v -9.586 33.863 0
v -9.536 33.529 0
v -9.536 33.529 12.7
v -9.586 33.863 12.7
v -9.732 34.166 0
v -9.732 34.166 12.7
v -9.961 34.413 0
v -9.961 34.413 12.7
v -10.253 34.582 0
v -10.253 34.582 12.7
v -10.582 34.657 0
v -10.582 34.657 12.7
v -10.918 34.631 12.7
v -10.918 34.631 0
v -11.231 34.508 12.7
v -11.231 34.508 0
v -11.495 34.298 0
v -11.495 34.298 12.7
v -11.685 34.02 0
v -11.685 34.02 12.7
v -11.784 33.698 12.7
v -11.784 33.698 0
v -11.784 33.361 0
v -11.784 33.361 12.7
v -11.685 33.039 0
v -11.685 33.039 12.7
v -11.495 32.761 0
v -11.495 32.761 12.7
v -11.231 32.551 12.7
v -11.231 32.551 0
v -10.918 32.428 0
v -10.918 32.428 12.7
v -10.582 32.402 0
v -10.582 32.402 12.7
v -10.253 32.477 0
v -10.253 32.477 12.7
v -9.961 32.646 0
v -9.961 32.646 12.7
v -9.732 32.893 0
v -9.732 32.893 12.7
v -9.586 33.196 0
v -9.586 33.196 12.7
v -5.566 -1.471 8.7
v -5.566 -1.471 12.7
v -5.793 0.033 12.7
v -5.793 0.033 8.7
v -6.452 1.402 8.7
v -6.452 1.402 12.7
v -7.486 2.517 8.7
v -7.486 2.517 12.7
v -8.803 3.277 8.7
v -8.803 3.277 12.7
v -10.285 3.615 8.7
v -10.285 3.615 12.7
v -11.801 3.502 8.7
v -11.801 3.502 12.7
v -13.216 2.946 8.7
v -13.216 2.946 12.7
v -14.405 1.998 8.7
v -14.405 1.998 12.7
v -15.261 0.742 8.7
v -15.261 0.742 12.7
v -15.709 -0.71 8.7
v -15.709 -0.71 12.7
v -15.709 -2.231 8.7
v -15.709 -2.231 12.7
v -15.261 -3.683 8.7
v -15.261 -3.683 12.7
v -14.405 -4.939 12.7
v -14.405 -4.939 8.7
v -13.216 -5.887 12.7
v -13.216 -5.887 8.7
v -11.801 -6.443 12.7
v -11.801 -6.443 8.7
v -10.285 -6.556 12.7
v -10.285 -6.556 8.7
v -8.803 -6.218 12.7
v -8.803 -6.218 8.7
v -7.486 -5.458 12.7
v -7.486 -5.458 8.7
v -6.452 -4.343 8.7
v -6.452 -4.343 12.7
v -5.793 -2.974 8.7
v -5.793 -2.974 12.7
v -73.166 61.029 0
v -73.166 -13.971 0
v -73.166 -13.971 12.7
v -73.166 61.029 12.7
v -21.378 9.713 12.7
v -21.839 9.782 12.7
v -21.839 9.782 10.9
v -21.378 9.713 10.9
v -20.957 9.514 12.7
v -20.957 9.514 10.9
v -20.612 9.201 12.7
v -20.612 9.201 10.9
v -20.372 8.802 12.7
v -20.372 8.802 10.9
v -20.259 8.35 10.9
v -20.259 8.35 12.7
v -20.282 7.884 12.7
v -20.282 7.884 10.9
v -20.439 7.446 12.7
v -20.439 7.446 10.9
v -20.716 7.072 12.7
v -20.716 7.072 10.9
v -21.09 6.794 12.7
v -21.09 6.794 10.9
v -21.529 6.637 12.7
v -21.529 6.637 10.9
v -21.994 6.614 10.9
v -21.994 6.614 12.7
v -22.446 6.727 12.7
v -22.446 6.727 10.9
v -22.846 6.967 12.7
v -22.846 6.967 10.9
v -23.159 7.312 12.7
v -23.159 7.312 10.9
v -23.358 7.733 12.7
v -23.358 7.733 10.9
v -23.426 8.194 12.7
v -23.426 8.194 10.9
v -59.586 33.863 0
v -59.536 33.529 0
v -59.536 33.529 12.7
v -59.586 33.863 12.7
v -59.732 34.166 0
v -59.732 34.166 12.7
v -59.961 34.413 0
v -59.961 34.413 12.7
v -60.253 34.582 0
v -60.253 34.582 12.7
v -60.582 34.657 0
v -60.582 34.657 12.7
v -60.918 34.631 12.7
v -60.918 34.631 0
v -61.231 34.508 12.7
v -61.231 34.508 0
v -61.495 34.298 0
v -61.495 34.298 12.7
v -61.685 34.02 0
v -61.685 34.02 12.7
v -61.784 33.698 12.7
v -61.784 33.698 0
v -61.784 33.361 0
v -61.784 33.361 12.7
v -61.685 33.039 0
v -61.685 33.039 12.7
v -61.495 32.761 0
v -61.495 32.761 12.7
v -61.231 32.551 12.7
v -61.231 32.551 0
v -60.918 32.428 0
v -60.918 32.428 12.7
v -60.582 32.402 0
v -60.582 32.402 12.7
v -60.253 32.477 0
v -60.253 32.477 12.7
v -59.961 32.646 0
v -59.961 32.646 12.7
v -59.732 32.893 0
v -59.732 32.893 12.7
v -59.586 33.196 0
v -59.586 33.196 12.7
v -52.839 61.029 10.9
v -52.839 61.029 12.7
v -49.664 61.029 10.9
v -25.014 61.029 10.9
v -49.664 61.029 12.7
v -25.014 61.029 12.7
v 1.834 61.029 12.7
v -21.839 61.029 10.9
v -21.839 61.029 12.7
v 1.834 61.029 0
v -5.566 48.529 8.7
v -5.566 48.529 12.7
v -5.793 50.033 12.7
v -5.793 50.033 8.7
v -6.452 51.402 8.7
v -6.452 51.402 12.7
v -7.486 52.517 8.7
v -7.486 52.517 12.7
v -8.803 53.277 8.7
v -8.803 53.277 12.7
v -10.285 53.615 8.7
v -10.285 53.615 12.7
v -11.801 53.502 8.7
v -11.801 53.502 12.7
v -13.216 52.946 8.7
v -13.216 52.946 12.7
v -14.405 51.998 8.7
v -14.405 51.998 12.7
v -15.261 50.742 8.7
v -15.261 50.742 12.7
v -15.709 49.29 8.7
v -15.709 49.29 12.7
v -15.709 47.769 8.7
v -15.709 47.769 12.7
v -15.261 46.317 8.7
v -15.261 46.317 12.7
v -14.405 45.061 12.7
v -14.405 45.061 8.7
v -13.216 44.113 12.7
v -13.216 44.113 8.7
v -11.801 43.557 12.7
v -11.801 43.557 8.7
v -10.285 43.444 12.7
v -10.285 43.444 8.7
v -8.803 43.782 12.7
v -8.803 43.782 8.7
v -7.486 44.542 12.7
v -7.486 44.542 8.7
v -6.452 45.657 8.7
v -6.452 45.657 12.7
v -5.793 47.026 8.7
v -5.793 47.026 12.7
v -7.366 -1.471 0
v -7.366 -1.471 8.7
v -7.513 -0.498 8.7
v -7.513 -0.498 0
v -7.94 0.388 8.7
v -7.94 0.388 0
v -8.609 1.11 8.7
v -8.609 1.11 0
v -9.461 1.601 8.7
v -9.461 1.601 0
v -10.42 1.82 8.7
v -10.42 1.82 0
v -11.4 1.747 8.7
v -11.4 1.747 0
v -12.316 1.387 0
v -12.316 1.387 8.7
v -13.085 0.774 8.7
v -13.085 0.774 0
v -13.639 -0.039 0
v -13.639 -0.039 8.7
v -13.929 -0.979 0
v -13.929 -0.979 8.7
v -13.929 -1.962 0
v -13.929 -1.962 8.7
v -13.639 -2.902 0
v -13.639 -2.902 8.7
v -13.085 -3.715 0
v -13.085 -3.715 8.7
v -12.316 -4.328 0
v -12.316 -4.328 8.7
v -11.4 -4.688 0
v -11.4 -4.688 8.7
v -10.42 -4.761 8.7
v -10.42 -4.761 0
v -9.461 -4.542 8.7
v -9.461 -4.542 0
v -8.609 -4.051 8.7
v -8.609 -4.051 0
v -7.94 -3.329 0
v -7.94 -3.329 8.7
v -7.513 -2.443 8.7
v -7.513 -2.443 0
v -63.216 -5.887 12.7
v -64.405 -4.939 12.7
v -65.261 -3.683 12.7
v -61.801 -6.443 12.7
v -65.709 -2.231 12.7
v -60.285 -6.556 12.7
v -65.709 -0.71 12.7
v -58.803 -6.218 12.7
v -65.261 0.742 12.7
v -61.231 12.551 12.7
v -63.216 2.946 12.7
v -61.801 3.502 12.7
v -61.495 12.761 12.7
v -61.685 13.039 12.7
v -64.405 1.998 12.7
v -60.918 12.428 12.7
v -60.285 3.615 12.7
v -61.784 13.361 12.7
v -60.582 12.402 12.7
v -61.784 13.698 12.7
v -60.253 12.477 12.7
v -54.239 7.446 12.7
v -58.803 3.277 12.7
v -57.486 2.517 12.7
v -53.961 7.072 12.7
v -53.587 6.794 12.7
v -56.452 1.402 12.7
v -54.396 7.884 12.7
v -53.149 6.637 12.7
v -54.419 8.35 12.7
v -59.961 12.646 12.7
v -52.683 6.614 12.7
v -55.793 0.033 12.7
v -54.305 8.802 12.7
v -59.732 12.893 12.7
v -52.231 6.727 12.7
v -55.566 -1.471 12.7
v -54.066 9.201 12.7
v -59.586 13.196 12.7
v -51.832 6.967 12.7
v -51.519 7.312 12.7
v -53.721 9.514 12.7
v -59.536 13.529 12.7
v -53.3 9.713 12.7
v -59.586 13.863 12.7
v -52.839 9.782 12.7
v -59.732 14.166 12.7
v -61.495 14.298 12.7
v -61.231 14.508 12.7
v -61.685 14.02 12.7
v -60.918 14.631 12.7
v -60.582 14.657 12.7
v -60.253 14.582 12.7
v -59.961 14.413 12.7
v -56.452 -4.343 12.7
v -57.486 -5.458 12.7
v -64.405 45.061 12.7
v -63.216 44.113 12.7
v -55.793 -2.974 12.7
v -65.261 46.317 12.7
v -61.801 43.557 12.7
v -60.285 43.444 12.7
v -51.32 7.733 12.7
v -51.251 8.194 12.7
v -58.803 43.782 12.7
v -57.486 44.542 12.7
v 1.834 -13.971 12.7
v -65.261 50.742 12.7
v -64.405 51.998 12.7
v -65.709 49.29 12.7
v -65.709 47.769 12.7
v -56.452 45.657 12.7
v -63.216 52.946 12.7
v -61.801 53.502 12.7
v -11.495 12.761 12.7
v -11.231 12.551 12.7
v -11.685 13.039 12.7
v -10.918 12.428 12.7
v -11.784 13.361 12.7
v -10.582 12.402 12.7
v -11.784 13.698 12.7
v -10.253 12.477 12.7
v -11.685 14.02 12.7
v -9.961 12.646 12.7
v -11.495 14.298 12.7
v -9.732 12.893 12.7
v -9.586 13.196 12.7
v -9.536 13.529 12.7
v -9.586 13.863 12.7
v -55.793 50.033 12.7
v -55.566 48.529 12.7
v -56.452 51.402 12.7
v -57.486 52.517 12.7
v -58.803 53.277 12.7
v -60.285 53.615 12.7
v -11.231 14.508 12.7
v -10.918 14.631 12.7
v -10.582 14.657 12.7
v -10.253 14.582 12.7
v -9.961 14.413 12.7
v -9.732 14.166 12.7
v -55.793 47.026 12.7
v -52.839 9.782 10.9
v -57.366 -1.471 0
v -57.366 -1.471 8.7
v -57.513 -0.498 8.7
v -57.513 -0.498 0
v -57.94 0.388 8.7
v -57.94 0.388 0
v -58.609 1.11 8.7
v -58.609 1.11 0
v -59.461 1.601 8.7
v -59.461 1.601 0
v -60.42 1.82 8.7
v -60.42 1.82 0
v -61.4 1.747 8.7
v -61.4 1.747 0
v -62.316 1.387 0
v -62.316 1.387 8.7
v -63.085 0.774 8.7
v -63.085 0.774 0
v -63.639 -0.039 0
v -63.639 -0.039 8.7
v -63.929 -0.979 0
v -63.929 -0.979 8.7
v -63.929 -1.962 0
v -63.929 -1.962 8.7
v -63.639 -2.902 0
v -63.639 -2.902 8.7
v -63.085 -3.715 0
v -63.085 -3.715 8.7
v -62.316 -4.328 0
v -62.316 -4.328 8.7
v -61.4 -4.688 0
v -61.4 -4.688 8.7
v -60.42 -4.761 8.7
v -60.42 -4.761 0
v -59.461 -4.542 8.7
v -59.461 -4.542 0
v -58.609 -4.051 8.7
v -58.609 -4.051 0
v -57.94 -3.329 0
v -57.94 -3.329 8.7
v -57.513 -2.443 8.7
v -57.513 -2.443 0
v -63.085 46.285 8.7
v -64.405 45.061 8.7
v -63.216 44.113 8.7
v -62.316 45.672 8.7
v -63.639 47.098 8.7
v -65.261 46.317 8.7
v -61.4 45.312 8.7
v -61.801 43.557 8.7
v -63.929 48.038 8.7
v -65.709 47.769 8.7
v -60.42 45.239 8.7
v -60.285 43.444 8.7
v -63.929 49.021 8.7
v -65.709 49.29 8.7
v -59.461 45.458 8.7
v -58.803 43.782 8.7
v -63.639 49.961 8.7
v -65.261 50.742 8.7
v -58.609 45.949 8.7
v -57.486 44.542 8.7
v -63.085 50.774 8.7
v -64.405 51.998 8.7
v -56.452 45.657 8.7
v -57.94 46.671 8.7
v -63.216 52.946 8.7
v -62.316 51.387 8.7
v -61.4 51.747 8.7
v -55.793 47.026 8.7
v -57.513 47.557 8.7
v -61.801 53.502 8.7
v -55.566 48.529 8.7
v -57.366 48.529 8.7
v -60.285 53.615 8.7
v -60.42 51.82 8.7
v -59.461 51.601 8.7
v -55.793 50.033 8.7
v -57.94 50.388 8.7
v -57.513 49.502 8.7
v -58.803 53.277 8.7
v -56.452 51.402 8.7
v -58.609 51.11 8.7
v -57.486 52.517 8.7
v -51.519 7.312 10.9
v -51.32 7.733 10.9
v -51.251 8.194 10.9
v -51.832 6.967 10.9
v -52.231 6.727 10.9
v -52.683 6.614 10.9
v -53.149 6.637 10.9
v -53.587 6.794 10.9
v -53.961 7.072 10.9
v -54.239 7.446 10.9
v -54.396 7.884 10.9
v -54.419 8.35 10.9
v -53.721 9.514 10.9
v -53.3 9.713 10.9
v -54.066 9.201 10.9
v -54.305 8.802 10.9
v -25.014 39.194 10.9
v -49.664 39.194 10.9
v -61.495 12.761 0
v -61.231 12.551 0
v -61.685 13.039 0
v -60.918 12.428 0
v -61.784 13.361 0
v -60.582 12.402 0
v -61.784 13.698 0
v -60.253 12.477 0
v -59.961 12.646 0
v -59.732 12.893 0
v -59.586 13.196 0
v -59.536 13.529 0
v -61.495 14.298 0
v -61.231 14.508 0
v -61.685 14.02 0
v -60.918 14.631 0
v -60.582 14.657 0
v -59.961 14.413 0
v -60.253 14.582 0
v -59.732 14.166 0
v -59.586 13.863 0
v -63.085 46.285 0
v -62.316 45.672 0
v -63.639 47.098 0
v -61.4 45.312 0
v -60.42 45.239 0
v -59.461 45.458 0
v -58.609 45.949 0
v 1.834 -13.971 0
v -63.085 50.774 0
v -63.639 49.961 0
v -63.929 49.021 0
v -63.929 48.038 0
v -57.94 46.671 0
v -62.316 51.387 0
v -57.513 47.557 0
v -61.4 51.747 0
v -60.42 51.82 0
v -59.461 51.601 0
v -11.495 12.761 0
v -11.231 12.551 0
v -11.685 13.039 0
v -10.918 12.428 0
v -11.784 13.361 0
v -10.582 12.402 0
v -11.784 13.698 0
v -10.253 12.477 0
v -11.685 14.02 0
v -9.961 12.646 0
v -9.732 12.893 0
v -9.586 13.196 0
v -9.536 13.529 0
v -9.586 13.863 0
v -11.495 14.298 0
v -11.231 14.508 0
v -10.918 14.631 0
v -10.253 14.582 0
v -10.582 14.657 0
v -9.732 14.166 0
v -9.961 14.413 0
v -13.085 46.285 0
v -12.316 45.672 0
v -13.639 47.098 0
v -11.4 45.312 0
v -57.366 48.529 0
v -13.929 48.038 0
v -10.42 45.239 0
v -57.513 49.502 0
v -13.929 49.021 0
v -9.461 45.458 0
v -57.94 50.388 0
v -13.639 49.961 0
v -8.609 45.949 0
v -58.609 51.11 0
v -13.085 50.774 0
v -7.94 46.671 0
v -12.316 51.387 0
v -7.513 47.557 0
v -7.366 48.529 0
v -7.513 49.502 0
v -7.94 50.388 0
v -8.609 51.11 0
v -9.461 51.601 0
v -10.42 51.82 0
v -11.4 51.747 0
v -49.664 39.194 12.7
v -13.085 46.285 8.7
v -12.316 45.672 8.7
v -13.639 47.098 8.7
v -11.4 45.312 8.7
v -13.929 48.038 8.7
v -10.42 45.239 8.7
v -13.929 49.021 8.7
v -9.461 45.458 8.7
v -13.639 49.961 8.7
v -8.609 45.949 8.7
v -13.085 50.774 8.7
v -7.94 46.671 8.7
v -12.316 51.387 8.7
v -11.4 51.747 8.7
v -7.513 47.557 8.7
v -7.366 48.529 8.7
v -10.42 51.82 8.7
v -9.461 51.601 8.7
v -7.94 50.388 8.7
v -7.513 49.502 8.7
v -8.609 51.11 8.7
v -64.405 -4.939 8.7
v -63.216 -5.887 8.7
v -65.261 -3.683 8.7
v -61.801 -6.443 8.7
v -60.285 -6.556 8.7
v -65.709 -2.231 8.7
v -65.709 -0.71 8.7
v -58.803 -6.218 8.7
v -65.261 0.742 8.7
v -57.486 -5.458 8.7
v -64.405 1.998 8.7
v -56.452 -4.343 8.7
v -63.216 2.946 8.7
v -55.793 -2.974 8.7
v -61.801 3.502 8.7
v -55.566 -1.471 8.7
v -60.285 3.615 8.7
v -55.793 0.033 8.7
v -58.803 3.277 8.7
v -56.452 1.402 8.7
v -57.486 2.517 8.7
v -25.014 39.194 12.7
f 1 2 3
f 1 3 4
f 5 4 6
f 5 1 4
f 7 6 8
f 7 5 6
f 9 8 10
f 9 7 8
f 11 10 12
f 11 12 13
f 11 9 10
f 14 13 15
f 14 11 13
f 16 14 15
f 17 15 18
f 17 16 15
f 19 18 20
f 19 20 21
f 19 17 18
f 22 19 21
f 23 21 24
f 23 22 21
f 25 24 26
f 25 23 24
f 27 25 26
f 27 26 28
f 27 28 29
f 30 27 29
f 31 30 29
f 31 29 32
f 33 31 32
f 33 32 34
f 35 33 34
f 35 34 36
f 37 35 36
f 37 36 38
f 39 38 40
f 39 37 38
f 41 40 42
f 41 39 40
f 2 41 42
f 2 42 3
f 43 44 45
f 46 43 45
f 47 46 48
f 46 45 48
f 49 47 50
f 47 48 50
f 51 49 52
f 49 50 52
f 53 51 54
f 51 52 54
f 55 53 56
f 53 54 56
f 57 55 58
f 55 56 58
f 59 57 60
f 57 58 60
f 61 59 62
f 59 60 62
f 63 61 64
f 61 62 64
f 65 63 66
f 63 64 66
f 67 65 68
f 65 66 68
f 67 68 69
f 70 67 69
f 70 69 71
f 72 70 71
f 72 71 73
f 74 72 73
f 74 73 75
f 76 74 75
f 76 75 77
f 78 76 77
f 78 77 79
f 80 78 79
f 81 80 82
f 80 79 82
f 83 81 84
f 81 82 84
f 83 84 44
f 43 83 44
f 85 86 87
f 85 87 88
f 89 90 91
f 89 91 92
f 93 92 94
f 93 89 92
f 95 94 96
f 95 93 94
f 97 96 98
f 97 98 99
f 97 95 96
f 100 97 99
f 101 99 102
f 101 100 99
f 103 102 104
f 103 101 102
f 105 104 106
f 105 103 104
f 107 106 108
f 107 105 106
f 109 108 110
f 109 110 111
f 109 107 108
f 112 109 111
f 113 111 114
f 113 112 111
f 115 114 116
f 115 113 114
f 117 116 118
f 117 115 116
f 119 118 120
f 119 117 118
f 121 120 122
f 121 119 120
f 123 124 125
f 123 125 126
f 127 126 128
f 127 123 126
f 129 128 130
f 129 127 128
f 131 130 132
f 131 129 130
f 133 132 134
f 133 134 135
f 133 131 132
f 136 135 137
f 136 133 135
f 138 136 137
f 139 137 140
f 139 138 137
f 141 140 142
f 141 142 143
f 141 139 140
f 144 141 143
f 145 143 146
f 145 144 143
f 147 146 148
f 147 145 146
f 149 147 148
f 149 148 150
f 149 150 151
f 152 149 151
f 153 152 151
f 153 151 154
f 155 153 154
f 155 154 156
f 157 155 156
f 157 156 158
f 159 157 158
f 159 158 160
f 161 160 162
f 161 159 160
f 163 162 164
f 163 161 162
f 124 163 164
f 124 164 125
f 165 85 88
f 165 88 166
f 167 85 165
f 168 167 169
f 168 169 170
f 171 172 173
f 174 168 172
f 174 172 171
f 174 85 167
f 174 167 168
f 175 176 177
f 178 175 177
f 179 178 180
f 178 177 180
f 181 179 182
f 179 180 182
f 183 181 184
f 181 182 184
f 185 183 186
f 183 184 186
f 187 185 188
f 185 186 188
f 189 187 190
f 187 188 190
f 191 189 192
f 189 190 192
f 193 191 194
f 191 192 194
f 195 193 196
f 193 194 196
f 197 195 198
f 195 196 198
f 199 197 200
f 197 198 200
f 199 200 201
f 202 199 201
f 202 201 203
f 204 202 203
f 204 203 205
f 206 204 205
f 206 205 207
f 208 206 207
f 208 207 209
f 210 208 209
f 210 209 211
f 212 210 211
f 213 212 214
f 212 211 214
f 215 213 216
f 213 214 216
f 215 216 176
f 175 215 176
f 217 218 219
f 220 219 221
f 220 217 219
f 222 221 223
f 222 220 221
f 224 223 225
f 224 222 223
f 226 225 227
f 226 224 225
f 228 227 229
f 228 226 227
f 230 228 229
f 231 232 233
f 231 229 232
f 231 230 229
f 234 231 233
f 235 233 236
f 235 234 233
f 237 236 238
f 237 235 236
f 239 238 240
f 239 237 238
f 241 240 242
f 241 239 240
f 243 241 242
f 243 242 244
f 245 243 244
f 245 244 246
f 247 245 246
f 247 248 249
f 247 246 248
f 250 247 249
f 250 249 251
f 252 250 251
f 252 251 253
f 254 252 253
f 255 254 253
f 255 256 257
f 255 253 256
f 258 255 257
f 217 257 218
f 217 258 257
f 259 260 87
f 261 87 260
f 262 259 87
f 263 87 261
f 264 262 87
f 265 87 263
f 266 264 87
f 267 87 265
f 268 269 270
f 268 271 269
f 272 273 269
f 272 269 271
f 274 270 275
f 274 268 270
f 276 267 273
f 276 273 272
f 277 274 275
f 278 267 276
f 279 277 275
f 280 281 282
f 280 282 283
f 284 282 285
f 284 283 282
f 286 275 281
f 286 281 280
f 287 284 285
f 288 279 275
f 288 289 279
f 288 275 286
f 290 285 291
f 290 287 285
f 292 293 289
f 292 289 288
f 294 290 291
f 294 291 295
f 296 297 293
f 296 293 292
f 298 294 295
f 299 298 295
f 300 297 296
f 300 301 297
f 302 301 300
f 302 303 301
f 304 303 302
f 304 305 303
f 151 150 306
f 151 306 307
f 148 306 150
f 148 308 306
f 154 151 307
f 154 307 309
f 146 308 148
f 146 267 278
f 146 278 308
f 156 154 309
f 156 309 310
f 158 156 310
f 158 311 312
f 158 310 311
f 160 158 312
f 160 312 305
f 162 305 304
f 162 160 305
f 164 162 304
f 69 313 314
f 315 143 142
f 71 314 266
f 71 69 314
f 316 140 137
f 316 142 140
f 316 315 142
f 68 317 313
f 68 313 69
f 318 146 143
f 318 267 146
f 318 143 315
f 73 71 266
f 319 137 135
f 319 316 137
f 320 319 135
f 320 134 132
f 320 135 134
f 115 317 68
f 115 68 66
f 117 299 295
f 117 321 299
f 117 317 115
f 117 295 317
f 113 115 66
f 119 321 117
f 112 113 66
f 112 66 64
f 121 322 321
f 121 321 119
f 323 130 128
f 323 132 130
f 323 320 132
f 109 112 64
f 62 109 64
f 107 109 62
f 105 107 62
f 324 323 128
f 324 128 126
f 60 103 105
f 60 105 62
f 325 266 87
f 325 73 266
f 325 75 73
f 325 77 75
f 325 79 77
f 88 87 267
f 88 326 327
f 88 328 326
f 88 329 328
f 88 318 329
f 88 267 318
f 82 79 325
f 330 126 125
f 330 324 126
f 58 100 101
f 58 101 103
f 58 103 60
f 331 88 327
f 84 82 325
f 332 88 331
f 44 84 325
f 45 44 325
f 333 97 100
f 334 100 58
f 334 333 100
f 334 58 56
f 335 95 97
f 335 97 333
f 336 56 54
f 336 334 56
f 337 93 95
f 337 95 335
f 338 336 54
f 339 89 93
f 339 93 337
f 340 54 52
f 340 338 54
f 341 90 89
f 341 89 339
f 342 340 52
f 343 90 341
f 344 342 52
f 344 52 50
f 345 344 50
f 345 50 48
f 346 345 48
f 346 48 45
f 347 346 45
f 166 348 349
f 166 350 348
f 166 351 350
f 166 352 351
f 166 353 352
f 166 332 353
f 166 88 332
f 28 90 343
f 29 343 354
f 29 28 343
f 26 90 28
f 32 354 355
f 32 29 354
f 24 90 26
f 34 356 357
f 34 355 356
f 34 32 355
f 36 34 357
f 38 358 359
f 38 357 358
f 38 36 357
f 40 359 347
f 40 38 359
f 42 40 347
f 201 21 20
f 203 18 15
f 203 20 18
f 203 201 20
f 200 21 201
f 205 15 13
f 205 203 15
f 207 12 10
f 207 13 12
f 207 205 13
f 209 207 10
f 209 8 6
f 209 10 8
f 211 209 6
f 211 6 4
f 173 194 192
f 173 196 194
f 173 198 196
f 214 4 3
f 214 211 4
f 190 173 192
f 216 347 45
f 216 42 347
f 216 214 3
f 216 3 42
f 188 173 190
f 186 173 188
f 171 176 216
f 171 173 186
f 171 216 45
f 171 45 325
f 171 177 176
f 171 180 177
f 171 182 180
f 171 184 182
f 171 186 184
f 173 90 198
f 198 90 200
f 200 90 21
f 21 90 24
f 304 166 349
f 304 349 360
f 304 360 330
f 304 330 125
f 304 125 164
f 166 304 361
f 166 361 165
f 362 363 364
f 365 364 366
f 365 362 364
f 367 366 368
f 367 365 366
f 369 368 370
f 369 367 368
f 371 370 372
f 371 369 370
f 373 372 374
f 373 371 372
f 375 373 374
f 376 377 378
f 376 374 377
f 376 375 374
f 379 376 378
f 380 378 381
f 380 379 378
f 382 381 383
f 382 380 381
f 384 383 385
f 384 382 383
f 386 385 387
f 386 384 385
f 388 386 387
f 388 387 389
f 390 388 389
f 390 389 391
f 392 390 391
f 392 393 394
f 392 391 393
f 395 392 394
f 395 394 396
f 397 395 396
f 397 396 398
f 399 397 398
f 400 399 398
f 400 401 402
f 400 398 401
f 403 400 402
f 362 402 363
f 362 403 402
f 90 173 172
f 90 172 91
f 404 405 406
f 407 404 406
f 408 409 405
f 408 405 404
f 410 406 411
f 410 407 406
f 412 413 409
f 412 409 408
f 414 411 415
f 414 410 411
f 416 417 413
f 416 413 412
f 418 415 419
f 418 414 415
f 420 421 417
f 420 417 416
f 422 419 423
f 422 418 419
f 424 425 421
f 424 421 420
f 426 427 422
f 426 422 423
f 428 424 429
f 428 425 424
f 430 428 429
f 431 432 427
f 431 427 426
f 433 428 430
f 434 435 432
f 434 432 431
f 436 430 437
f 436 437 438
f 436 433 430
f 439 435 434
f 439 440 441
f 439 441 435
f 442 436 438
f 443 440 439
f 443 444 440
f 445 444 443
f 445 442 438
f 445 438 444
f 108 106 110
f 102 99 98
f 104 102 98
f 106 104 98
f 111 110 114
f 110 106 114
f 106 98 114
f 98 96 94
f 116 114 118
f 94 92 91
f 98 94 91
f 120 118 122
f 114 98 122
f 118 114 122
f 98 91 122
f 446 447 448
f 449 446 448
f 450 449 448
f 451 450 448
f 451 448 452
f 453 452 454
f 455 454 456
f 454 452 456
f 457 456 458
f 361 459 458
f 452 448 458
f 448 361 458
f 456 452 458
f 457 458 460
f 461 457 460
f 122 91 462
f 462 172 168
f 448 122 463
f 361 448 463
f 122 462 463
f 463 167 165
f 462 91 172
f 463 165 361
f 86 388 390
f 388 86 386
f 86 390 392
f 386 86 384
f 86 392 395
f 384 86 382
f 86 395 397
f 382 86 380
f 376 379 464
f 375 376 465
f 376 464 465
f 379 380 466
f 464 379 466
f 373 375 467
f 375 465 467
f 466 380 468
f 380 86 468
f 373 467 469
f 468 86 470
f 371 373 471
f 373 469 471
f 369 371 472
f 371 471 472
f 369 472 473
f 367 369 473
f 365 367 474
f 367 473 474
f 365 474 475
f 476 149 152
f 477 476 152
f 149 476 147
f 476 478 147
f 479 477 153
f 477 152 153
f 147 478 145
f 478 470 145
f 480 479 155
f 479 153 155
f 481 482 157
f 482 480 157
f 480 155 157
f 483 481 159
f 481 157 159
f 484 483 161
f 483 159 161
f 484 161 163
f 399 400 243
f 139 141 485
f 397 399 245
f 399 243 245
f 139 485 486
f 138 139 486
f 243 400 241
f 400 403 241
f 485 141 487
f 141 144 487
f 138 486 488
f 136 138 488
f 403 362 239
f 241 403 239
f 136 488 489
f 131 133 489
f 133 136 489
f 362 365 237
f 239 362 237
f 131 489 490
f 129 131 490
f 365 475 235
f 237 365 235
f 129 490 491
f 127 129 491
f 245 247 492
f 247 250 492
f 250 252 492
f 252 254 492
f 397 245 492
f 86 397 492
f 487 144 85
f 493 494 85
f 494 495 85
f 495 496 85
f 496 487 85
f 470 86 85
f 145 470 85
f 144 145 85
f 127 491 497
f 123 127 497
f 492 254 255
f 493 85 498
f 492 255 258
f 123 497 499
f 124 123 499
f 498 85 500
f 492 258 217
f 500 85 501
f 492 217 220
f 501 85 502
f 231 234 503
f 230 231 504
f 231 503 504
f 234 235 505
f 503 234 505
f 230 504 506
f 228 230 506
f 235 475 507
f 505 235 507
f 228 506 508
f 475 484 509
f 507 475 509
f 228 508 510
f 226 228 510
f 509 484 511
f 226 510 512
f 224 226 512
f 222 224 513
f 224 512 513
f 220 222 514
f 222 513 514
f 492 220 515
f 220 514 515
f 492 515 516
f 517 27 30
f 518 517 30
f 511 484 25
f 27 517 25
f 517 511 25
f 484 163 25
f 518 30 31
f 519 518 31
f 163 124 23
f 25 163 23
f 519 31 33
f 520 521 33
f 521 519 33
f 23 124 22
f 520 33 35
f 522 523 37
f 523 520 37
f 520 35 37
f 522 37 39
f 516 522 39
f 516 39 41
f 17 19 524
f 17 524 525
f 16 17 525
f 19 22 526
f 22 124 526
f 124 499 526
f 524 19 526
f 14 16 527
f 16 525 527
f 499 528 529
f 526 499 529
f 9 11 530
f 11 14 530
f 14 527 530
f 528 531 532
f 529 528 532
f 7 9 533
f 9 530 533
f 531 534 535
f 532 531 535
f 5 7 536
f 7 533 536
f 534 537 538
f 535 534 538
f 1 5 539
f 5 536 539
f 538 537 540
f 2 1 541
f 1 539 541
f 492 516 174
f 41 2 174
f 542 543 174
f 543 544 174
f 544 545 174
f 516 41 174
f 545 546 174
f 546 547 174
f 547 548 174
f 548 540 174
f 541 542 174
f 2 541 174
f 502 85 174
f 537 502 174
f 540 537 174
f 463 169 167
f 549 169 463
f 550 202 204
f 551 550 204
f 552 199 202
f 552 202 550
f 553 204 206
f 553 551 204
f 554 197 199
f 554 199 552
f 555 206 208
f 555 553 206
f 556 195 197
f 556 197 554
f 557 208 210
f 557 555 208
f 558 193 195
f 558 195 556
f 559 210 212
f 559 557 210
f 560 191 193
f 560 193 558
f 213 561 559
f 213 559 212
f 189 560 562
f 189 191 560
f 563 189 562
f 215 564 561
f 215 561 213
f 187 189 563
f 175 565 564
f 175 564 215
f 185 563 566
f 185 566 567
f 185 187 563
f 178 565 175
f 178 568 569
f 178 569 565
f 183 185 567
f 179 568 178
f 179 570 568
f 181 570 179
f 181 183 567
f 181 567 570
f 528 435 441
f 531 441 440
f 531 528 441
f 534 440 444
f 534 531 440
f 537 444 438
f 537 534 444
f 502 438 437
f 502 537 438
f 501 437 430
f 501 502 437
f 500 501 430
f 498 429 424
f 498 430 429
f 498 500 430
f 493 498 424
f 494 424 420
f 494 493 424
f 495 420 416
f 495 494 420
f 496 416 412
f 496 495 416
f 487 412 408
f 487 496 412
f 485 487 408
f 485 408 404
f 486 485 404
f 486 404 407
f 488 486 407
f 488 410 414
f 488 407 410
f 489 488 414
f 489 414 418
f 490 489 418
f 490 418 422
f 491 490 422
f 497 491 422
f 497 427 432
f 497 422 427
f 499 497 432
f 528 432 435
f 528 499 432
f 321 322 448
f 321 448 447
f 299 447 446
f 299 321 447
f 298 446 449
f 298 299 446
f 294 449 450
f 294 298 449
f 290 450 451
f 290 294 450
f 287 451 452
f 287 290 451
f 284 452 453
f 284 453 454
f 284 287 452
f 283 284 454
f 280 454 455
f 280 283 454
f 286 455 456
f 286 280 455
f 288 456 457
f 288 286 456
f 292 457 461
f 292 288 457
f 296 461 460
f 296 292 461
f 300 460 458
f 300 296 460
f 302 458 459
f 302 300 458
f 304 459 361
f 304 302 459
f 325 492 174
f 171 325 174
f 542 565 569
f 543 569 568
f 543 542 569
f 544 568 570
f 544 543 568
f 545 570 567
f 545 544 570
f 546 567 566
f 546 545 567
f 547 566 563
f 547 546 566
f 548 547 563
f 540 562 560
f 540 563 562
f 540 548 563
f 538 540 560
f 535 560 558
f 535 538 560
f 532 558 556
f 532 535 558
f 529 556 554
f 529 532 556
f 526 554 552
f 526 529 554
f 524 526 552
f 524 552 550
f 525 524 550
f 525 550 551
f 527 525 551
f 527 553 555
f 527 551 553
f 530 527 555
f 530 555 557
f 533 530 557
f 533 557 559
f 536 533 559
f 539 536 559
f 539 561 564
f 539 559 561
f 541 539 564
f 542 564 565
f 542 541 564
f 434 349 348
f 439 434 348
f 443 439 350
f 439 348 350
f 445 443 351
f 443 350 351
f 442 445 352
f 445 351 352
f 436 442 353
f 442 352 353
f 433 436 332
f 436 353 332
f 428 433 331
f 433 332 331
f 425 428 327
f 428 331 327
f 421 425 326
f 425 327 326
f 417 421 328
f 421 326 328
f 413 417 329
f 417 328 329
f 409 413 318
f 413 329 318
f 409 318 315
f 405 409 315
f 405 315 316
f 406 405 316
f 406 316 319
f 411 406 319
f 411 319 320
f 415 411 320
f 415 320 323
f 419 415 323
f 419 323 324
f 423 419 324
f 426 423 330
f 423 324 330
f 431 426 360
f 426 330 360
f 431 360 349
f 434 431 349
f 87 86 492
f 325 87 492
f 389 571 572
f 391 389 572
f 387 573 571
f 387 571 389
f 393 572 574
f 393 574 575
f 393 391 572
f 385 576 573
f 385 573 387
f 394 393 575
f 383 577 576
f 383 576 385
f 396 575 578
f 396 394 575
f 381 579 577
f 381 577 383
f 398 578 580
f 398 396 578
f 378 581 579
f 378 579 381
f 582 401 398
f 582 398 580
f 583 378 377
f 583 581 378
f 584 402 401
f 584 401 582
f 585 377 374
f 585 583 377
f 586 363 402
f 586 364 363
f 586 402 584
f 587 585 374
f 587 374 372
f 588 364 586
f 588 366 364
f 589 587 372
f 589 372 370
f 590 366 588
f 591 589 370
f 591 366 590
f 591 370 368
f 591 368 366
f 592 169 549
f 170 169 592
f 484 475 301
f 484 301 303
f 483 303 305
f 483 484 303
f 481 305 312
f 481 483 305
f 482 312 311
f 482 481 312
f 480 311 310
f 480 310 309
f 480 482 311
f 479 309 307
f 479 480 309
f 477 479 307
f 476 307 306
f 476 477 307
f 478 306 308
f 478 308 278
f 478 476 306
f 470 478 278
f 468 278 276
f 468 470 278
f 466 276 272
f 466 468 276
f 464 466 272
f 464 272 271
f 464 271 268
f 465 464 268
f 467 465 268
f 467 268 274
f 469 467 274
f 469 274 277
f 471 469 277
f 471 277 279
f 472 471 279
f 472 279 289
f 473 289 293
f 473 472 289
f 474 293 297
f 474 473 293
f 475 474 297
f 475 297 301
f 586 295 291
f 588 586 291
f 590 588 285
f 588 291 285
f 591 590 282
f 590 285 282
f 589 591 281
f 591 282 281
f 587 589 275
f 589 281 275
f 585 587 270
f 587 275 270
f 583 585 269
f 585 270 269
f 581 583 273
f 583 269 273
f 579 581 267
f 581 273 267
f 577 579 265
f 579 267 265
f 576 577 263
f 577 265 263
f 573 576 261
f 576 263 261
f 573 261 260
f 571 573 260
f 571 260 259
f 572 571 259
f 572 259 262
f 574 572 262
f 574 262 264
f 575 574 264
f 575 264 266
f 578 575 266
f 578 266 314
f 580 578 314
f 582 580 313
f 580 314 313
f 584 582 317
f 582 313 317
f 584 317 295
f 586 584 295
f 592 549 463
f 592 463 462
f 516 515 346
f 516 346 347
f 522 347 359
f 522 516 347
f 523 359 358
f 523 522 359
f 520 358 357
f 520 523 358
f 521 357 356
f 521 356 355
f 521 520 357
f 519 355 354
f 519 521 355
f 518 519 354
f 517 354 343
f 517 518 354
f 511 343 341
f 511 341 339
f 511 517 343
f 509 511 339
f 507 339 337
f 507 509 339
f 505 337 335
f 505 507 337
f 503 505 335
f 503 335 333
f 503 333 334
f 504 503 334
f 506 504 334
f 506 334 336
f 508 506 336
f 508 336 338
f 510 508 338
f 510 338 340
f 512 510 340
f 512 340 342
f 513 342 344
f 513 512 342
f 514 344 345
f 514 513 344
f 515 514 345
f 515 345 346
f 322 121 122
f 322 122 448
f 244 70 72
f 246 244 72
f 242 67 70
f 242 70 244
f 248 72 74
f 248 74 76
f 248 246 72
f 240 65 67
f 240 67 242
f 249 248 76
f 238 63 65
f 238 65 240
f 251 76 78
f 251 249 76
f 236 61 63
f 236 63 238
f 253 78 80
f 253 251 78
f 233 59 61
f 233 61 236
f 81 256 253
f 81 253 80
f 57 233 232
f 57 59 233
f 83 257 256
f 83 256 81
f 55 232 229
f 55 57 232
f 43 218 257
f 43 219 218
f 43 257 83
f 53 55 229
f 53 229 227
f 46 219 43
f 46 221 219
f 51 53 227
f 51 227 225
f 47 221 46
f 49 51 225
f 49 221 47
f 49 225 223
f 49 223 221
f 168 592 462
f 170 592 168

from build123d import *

# Parameters (mm, degrees)
SKETCH1_W           = 75
SKETCH1_H           = 75
SKETCH1_R           = 3.3
SKETCH1_R_2         = 1.1303
BOSS_EXTRUDE1_DEPTH = 12.7
SKETCH2_R           = 5.1
CUT_EXTRUDE1_DEPTH  = 4
CUT_EXTRUDE2_DEPTH  = 1.8


with BuildPart() as part:
    # Sketch1 → Boss-Extrude1 (new body)
    with BuildSketch(Plane.XY):
        with Locations((-35.66615728, 23.529473029)):
            Rectangle(SKETCH1_W, SKETCH1_H)
        with Locations((-60.66615728, -1.470526971)):
            Circle(SKETCH1_R, mode=Mode.SUBTRACT)
        with Locations((-10.66615728, -1.470526971)):
            Circle(SKETCH1_R, mode=Mode.SUBTRACT)
        with Locations((-10.66615728, 48.529473029)):
            Circle(SKETCH1_R, mode=Mode.SUBTRACT)
        with Locations((-60.66615728, 48.529473029)):
            Circle(SKETCH1_R, mode=Mode.SUBTRACT)
        with Locations((-60.66615728, 33.529473029)):
            Circle(SKETCH1_R_2, mode=Mode.SUBTRACT)
        with Locations((-10.66615728, 33.529473029)):
            Circle(SKETCH1_R_2, mode=Mode.SUBTRACT)
        with Locations((-60.66615728, 13.529473029)):
            Circle(SKETCH1_R_2, mode=Mode.SUBTRACT)
        with Locations((-10.66615728, 13.529473029)):
            Circle(SKETCH1_R_2, mode=Mode.SUBTRACT)
    extrude(amount=BOSS_EXTRUDE1_DEPTH)

    # Sketch2 → Cut-Extrude1 (cut)
    with BuildSketch(Plane.XY.offset(12.7)):
        with Locations((-60.66615728, 48.529473029)):
            Circle(SKETCH2_R)
        with Locations((-10.66615728, 48.529473029)):
            Circle(SKETCH2_R)
        with Locations((-60.66615728, -1.470526971)):
            Circle(SKETCH2_R)
        with Locations((-10.66615728, -1.470526971)):
            Circle(SKETCH2_R)
    extrude(amount=-CUT_EXTRUDE1_DEPTH, mode=Mode.SUBTRACT)

    # Sketch3 → Cut-Extrude2 (cut)
    with BuildSketch(Plane.XY.offset(12.7)):
        with BuildLine():
            Line((-49.663826945, 39.194037394), (-25.013826945, 39.194037394))
            Line((-25.013826945, 39.194037394), (-25.013826945, 61.029473029))
            Line((-25.013826945, 61.029473029), (-21.838826945, 61.029473029))
            Line((-21.838826945, 61.029473029), (-21.838826945, 39.194037394))
            Line((-21.838826945, 39.194037394), (-21.838826945, 9.781537394))
            ThreePointArc((-21.838826945, 9.781537394), (-20.71629493, 7.071505379), (-23.426326945, 8.194037394))
            Line((-23.426326945, 8.194037394), (-51.251326945, 8.194037394))
            ThreePointArc((-51.251326945, 8.194037394), (-53.96135896, 7.071505379), (-52.838826945, 9.781537394))
            Line((-52.838826945, 9.781537394), (-52.838826945, 39.194037394))
            Line((-52.838826945, 39.194037394), (-52.838826945, 61.029473029))
            Line((-52.838826945, 61.029473029), (-49.663826945, 61.029473029))
            Line((-49.663826945, 61.029473029), (-49.663826945, 39.194037394))
        make_face()
    extrude(amount=-CUT_EXTRUDE2_DEPTH, mode=Mode.SUBTRACT)


solid = part.part
